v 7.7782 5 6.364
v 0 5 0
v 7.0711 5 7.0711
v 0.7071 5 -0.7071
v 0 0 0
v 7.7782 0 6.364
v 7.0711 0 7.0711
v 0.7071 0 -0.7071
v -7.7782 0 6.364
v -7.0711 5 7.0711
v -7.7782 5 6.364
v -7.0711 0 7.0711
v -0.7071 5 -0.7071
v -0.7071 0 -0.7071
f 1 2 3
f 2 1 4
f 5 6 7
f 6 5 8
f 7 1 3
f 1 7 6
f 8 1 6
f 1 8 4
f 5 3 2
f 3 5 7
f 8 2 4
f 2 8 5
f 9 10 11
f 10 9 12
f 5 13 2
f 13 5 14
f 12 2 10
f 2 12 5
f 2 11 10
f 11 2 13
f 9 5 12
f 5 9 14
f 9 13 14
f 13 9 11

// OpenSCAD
original_box = [1, 5, 10]; // Original object dimensions.
rotation_angle = [0, 45, 0]; // Original object rotation.

// Original object.
rotate(rotation_angle)
    cube(original_box);

/*
 * The mirror functions creates a reflection of the object across the given x, y, z plane.
 * Parameters:
 *      - mirror takes a vector as a parameter that is orthogonal to the plane for which the object is mirrored
 */
mirror([1, 0, 0]) {
    rotate(rotation_angle)
        cube(original_box);
}
